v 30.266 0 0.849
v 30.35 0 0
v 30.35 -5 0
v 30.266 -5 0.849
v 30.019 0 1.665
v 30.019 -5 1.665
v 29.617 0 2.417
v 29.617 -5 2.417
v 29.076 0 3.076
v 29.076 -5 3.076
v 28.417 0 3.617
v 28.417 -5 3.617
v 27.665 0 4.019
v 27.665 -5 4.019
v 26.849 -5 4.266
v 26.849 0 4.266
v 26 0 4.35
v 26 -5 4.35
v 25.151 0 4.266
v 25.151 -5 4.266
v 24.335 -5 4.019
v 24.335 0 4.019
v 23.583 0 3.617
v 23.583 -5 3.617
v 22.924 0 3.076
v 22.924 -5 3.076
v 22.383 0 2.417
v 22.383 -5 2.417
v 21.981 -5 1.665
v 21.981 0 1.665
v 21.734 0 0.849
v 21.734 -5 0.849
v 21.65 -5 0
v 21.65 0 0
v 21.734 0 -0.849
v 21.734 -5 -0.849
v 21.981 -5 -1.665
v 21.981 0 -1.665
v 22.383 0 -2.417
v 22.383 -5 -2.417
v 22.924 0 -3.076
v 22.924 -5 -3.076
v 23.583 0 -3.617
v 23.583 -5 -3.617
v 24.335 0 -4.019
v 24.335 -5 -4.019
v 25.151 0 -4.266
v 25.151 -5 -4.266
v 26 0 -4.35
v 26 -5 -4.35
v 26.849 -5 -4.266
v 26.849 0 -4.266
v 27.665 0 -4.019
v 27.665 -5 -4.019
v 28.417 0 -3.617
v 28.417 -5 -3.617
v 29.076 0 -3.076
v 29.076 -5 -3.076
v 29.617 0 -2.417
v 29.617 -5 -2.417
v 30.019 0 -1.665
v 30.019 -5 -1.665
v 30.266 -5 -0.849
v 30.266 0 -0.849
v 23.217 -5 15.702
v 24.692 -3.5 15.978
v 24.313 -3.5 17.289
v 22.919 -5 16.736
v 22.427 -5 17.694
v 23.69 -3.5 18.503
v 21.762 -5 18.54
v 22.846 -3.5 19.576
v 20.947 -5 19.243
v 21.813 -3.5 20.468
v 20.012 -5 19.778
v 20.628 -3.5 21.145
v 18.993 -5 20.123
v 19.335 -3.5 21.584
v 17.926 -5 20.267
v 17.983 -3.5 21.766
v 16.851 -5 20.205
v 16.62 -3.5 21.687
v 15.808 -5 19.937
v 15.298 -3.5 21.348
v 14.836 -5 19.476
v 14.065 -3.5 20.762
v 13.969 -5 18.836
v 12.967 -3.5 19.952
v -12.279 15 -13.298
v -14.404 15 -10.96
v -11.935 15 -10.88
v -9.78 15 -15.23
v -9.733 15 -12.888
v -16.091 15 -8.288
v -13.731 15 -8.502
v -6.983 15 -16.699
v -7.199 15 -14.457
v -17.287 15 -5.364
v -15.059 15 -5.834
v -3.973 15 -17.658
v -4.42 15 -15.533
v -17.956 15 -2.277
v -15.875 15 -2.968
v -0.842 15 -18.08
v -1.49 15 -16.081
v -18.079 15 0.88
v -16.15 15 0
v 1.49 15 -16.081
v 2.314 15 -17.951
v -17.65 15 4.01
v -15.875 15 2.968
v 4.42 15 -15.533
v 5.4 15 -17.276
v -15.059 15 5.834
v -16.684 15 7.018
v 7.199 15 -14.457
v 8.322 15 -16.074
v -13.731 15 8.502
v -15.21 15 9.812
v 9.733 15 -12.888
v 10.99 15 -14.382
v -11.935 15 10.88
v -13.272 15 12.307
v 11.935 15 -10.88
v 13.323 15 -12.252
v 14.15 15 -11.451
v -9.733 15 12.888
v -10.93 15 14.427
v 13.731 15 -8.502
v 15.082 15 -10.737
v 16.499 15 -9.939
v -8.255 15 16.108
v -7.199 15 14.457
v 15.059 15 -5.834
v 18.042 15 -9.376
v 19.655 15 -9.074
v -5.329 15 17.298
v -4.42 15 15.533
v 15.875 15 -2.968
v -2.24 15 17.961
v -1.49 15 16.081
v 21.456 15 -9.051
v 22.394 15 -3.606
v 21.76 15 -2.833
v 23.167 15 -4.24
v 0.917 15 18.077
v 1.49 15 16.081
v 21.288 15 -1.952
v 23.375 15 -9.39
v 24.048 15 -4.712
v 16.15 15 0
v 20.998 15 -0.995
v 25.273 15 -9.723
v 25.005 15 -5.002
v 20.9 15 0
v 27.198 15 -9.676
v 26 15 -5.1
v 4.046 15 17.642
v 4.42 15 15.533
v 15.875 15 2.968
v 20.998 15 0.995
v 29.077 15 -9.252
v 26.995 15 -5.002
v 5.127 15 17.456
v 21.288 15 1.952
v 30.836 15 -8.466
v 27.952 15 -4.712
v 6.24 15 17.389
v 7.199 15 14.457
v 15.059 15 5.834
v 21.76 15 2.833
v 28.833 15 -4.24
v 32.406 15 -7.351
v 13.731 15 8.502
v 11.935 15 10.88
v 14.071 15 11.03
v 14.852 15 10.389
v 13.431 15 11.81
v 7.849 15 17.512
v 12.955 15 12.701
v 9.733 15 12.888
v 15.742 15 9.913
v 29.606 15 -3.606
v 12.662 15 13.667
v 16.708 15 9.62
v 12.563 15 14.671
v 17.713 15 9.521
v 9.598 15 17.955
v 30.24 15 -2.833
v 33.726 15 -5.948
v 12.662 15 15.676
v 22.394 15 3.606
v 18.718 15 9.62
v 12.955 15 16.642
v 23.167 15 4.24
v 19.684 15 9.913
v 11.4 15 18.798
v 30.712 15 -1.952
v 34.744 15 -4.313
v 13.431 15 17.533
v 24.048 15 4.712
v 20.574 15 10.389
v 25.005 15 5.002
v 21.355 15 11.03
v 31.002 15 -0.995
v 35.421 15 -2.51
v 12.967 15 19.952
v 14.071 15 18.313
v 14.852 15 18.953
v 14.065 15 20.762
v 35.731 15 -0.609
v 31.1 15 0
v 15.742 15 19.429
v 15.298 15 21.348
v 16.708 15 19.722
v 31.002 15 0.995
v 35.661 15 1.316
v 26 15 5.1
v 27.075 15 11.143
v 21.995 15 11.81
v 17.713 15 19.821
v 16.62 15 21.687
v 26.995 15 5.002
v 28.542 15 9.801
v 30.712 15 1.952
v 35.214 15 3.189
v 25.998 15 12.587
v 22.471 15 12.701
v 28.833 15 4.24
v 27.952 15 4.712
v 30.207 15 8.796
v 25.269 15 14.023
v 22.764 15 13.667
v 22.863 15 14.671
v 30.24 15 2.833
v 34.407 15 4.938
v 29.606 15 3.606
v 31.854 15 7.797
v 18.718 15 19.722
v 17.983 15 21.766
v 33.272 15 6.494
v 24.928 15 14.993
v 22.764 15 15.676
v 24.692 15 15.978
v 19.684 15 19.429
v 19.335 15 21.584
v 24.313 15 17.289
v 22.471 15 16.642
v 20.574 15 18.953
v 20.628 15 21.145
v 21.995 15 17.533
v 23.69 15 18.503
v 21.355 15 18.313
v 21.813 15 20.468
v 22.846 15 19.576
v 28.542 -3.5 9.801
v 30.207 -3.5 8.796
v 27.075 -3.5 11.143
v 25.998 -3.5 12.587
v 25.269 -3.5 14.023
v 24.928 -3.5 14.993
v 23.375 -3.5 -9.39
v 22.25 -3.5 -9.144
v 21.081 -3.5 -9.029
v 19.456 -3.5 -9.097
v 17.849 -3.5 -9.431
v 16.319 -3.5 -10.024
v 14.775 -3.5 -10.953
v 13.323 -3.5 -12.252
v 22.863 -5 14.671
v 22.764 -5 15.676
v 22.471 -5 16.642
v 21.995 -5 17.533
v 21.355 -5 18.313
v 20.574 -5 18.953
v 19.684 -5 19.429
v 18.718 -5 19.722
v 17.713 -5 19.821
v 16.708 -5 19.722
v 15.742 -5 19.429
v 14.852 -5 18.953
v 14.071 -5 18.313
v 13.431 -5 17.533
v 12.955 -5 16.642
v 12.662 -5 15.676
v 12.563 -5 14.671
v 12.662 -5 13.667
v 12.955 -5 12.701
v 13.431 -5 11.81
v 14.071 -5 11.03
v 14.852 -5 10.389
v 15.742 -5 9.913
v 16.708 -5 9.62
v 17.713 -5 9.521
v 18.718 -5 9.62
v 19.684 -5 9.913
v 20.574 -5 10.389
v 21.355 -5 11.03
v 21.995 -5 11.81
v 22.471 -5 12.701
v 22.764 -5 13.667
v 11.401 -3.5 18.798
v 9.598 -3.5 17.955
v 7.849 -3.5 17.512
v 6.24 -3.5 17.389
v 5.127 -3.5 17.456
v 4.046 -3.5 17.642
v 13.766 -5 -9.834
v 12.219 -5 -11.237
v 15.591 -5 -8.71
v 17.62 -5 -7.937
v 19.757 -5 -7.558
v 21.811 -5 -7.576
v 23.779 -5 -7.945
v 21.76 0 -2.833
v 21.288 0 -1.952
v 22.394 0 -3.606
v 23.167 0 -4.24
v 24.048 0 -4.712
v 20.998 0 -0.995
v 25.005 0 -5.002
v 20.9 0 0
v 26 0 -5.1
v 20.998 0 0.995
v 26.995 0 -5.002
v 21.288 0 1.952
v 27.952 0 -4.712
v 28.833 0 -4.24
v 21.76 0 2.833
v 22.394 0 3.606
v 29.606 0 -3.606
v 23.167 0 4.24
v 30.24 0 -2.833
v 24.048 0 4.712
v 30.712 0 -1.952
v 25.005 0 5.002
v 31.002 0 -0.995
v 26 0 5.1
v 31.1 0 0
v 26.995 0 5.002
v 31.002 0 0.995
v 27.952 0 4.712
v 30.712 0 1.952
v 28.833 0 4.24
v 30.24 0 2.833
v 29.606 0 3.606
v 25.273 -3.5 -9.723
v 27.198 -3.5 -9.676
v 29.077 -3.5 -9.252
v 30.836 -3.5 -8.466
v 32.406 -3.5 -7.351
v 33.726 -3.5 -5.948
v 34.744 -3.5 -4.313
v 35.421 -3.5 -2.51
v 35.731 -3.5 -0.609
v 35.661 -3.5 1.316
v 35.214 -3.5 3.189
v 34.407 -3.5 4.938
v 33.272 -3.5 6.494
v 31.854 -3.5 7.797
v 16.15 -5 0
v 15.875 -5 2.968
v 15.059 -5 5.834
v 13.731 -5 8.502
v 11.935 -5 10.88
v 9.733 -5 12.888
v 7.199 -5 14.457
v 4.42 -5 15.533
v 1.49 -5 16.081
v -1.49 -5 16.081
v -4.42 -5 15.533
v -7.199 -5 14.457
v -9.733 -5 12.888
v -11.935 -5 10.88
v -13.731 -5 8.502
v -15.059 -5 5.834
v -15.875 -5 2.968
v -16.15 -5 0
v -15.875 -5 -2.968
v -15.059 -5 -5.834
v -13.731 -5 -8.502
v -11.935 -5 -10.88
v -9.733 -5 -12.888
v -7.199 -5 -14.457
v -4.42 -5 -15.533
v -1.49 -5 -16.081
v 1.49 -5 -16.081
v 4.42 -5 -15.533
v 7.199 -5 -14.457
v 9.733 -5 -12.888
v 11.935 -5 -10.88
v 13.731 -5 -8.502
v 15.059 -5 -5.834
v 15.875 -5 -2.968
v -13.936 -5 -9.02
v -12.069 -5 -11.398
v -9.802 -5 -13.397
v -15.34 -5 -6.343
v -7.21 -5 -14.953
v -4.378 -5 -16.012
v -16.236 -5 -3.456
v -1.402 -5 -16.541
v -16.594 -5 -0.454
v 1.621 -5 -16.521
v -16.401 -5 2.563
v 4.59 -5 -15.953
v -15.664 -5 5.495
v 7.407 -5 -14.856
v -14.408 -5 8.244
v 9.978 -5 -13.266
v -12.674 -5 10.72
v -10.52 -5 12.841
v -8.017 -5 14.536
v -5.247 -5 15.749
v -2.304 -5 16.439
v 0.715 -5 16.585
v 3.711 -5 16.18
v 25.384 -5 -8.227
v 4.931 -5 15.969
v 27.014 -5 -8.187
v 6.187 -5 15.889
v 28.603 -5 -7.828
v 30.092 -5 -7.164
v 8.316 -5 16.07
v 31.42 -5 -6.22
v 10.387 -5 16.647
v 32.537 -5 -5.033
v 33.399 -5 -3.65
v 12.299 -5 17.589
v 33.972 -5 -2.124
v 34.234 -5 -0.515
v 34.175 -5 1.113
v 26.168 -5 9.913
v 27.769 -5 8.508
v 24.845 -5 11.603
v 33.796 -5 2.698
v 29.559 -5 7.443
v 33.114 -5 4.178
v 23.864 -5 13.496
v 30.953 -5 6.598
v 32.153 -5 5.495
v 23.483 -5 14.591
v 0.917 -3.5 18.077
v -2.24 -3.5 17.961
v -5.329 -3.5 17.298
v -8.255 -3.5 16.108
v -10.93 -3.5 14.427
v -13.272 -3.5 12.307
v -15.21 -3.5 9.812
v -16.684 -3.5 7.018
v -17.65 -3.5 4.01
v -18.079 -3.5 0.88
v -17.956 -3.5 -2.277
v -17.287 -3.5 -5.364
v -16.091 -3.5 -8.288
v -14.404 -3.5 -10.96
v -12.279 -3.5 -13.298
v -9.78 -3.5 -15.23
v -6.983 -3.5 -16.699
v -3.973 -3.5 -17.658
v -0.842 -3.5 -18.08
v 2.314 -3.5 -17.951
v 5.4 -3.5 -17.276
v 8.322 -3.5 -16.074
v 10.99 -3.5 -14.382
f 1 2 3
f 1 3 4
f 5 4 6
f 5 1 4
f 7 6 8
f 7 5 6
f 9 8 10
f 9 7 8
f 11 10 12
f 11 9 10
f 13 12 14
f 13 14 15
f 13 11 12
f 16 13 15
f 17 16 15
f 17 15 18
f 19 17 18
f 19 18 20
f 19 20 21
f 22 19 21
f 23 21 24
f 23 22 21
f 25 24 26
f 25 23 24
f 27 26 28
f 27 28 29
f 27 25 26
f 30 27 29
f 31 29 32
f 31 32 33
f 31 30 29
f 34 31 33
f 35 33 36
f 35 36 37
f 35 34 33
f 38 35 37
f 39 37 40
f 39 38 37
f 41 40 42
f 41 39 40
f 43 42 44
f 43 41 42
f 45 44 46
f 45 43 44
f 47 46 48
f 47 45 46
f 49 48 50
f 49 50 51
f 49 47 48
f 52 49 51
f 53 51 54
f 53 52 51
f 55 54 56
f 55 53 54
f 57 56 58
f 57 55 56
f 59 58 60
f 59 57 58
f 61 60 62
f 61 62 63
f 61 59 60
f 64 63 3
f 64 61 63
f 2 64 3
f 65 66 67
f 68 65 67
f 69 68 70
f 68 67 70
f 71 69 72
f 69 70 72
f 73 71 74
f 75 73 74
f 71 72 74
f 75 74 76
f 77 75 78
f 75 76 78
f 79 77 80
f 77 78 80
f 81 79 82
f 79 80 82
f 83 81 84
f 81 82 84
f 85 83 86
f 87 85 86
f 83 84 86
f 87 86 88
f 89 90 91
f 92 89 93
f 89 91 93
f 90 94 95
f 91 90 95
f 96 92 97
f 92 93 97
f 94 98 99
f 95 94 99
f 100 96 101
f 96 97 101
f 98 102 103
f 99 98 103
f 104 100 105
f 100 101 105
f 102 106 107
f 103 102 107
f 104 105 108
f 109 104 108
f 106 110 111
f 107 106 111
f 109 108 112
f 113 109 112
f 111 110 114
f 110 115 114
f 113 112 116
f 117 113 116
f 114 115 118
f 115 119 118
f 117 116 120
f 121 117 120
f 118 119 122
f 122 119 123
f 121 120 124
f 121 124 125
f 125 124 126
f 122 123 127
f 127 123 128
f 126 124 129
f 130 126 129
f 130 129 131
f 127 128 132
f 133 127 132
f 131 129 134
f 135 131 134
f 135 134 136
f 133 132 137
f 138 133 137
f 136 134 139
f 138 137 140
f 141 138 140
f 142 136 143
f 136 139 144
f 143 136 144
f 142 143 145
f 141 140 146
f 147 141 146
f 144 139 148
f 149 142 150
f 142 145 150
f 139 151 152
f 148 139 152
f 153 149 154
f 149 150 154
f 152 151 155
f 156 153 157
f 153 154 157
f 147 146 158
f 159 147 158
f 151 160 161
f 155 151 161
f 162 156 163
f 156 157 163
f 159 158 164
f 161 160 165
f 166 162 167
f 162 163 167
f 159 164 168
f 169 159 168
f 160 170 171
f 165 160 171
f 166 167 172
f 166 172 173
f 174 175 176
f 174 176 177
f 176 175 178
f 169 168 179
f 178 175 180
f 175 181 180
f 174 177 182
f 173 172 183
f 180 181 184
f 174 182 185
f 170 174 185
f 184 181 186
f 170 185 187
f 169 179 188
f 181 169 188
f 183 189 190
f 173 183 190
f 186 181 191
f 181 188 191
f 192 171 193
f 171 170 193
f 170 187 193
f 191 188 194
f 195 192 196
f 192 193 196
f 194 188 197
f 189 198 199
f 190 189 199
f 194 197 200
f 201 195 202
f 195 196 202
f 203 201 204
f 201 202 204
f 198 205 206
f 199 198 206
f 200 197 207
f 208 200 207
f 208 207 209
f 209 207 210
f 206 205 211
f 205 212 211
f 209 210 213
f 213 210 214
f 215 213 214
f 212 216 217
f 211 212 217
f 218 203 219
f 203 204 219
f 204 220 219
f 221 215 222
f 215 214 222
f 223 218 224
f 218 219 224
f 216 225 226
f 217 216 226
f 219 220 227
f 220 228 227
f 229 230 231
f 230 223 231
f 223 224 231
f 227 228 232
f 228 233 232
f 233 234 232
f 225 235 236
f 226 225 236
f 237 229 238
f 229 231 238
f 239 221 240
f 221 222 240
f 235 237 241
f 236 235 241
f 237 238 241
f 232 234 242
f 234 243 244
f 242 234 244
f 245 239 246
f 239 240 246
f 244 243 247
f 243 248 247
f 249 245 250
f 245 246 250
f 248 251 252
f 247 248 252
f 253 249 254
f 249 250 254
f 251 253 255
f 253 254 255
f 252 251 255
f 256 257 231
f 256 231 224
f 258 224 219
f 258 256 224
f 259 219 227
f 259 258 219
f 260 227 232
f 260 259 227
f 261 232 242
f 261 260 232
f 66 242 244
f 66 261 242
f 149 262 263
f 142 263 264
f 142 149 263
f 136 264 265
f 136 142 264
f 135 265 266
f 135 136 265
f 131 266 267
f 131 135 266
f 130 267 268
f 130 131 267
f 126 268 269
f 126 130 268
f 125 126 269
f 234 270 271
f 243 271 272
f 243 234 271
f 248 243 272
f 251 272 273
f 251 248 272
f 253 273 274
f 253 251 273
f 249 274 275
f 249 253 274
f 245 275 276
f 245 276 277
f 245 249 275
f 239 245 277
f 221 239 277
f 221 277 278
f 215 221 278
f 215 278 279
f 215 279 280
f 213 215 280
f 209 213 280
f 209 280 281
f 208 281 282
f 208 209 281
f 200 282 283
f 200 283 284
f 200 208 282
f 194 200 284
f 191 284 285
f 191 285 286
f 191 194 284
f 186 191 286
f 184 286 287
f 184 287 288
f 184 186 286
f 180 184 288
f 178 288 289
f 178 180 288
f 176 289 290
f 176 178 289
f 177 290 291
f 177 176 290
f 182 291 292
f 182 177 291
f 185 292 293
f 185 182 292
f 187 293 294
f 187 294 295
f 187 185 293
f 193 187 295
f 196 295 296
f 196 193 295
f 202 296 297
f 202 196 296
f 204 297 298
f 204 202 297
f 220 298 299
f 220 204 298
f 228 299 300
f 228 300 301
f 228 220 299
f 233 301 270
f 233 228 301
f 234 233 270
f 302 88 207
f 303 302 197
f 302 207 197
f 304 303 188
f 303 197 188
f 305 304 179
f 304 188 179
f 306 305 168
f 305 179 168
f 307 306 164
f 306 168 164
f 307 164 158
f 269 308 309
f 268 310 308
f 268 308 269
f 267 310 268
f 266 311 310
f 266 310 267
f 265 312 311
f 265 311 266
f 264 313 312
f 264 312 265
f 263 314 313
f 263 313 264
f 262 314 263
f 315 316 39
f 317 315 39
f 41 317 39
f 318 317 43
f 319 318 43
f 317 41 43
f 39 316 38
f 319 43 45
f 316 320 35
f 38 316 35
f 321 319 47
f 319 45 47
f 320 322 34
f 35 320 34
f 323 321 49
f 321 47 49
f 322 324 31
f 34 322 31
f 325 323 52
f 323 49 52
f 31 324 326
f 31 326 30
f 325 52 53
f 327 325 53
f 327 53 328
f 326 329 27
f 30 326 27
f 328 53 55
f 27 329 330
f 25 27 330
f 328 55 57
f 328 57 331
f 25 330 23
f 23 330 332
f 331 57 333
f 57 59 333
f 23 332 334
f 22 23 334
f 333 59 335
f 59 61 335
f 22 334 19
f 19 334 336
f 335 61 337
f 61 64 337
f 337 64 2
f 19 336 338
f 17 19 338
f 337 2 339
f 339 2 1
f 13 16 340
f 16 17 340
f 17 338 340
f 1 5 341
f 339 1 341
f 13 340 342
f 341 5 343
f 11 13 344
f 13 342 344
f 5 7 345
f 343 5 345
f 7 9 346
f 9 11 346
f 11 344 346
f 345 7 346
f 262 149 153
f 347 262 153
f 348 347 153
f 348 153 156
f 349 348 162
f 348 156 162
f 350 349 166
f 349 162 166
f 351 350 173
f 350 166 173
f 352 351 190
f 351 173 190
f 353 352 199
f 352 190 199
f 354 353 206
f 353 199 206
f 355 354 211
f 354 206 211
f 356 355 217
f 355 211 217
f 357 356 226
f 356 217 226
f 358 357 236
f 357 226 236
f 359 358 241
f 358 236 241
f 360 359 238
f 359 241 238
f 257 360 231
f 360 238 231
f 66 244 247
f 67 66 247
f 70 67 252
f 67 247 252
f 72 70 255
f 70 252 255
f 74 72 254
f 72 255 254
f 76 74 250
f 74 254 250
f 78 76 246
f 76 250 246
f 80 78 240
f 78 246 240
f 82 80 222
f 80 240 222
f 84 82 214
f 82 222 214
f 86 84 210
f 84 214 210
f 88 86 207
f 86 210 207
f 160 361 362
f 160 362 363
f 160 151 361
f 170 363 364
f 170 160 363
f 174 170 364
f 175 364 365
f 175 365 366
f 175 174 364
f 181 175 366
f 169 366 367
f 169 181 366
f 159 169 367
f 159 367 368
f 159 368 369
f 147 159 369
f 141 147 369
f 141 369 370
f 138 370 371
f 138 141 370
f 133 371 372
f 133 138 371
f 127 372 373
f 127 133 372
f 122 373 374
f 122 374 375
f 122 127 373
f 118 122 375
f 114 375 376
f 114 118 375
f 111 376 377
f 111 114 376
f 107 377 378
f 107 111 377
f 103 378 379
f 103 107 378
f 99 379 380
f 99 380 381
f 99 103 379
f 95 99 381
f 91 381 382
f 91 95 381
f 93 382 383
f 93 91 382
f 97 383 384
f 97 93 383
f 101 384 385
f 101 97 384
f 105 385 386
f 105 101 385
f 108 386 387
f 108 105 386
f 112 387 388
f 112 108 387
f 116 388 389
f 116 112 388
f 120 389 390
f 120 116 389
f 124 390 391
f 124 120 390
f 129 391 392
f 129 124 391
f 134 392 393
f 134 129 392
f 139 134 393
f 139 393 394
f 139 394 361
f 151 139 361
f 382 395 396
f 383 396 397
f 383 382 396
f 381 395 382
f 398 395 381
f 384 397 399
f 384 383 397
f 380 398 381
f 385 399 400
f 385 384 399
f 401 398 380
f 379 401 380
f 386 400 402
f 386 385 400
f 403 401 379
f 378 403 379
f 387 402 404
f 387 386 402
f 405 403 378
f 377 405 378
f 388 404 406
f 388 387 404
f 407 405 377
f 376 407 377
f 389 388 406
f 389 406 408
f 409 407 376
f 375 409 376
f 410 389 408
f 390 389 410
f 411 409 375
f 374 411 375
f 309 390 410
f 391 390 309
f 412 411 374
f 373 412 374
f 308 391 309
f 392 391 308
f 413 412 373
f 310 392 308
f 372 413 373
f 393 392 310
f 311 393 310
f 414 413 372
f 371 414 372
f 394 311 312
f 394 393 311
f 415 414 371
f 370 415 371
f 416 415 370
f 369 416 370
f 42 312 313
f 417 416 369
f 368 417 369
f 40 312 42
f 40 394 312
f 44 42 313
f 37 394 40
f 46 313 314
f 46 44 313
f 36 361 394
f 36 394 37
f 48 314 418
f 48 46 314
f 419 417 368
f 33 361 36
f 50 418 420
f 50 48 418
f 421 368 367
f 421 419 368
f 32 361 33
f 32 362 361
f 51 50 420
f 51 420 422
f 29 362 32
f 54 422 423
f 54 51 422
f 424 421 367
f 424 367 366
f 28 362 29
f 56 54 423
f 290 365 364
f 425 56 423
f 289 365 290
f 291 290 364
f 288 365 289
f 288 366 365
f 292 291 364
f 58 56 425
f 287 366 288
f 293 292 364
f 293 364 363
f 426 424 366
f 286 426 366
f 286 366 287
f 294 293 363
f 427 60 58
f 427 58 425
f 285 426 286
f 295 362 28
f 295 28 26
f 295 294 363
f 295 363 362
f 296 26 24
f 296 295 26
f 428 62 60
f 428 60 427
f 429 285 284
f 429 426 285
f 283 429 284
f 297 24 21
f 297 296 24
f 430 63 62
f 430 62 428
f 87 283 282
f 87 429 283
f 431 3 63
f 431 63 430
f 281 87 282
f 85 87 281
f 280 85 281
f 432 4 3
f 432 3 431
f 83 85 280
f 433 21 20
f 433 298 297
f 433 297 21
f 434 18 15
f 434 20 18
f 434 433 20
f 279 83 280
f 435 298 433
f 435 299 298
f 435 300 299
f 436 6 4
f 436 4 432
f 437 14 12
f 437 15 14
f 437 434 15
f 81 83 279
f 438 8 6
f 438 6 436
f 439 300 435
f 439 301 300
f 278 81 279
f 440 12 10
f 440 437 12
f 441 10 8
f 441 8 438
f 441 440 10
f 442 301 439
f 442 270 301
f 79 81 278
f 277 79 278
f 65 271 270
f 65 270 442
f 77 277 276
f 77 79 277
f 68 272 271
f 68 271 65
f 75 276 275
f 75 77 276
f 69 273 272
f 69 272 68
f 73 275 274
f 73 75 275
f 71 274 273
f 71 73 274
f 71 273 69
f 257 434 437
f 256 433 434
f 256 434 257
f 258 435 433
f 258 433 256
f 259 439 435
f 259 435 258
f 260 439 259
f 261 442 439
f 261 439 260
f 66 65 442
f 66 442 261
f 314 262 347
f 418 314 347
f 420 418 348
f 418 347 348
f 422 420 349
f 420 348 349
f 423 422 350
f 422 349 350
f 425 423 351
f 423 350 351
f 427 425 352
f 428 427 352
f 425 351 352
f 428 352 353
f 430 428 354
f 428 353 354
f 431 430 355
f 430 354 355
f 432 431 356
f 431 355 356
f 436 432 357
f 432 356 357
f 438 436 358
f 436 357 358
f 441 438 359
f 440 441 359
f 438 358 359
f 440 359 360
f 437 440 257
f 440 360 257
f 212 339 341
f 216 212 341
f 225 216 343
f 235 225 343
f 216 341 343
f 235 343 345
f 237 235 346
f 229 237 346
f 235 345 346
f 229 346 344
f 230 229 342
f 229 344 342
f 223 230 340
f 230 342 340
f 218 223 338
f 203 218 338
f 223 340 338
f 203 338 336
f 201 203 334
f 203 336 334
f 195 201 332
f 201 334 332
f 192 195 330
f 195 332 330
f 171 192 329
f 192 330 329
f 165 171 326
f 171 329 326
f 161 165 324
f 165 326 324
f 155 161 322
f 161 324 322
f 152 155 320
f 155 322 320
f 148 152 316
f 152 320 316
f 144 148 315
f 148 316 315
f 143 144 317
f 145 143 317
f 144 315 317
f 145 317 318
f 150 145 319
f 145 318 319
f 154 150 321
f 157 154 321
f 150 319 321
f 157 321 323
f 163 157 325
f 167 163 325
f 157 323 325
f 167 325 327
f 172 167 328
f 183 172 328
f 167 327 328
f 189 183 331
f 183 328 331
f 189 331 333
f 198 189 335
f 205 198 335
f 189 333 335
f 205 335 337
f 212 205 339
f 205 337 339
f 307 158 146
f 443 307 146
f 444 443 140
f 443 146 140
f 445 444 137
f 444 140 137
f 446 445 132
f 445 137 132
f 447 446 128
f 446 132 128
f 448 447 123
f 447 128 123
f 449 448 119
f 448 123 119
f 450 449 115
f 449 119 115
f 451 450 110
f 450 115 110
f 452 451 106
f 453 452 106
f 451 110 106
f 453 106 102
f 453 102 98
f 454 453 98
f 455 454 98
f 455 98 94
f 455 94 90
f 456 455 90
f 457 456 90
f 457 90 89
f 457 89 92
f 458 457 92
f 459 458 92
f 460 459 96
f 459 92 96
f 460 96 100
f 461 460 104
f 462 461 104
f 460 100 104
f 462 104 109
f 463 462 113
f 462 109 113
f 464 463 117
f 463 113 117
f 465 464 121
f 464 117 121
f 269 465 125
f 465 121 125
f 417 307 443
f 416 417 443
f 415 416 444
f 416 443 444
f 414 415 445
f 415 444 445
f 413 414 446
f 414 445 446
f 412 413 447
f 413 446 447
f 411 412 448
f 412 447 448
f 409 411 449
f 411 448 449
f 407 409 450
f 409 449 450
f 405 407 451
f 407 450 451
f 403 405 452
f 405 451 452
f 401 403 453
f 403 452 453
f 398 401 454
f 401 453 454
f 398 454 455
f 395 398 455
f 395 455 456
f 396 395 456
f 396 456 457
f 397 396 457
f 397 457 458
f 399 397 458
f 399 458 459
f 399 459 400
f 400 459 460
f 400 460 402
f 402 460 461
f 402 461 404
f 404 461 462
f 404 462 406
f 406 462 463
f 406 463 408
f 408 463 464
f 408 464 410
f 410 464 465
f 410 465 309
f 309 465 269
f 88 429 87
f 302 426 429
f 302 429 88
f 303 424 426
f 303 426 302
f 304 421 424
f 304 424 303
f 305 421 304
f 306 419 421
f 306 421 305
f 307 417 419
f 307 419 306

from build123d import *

# Parameters (mm, degrees)
F0_R     = 16.15
F0_R_2   = 5.1
F0_R_3   = 5.15
F1_DEPTH = 15
F0_R_4   = 4.35
F2_DEPTH = 5
F3_R     = 10
F4_SIZE  = 1.5


with BuildPart() as f1:
    # F0 (on Front) → F1 (new body)
    with BuildSketch(Plane.XZ):
        with BuildLine():
            ThreePointArc((17.4720673077, -4.726189162), (35.3828933588, -2.6502475765), (21.2048683234, 8.4893587629))
            ThreePointArc((21.2048683234, 8.4893587629), (21.2879399951, 20.805683816), (10.6130350411, 14.6619741923))
            ThreePointArc((10.6130350411, 14.6619741923), (-17.0636591342, -6.0366826114), (17.4720673077, -4.726189162))
        make_face()
        Circle(F0_R, mode=Mode.SUBTRACT)
        with Locations((26, 0)):
            Circle(F0_R_2, mode=Mode.SUBTRACT)
        with Locations((17.7130288462, 14.6713533491)):
            Circle(F0_R_3, mode=Mode.SUBTRACT)
    extrude(amount=-F1_DEPTH)

    # F0 (on Front) → F2 (join)
    with BuildSketch(Plane.XZ):
        with BuildLine():
            ThreePointArc((17.4720673077, -4.726189162), (35.3828933588, -2.6502475765), (21.2048683234, 8.4893587629))
            ThreePointArc((21.2048683234, 8.4893587629), (21.2879399951, 20.805683816), (10.6130350411, 14.6619741923))
            ThreePointArc((10.6130350411, 14.6619741923), (-17.0636591342, -6.0366826114), (17.4720673077, -4.726189162))
        make_face()
        Circle(F0_R, mode=Mode.SUBTRACT)
        with Locations((26, 0)):
            Circle(F0_R_2, mode=Mode.SUBTRACT)
        with Locations((17.7130288462, 14.6713533491)):
            Circle(F0_R_3, mode=Mode.SUBTRACT)
        with Locations((26, 0)):
            Circle(F0_R_2)
        with Locations((26, 0)):
            Circle(F0_R_4, mode=Mode.SUBTRACT)
    extrude(amount=F2_DEPTH)

    # F3
    f3_edges = [f1.edges().sort_by_distance(p)[0] for p in [
        (10.613035, 5, 14.661974),
        (21.204868, 5, 8.489359),
        (17.472067, 5, -4.726189),
    ]]
    fillet(f3_edges, radius=F3_R)

    # F4
    f4_edges = [f1.edges().sort_by_distance(p)[0] for p in [
        (-17.286785, -5, -5.364427),
    ]]
    chamfer(f4_edges, length=F4_SIZE)


solid = f1.part
